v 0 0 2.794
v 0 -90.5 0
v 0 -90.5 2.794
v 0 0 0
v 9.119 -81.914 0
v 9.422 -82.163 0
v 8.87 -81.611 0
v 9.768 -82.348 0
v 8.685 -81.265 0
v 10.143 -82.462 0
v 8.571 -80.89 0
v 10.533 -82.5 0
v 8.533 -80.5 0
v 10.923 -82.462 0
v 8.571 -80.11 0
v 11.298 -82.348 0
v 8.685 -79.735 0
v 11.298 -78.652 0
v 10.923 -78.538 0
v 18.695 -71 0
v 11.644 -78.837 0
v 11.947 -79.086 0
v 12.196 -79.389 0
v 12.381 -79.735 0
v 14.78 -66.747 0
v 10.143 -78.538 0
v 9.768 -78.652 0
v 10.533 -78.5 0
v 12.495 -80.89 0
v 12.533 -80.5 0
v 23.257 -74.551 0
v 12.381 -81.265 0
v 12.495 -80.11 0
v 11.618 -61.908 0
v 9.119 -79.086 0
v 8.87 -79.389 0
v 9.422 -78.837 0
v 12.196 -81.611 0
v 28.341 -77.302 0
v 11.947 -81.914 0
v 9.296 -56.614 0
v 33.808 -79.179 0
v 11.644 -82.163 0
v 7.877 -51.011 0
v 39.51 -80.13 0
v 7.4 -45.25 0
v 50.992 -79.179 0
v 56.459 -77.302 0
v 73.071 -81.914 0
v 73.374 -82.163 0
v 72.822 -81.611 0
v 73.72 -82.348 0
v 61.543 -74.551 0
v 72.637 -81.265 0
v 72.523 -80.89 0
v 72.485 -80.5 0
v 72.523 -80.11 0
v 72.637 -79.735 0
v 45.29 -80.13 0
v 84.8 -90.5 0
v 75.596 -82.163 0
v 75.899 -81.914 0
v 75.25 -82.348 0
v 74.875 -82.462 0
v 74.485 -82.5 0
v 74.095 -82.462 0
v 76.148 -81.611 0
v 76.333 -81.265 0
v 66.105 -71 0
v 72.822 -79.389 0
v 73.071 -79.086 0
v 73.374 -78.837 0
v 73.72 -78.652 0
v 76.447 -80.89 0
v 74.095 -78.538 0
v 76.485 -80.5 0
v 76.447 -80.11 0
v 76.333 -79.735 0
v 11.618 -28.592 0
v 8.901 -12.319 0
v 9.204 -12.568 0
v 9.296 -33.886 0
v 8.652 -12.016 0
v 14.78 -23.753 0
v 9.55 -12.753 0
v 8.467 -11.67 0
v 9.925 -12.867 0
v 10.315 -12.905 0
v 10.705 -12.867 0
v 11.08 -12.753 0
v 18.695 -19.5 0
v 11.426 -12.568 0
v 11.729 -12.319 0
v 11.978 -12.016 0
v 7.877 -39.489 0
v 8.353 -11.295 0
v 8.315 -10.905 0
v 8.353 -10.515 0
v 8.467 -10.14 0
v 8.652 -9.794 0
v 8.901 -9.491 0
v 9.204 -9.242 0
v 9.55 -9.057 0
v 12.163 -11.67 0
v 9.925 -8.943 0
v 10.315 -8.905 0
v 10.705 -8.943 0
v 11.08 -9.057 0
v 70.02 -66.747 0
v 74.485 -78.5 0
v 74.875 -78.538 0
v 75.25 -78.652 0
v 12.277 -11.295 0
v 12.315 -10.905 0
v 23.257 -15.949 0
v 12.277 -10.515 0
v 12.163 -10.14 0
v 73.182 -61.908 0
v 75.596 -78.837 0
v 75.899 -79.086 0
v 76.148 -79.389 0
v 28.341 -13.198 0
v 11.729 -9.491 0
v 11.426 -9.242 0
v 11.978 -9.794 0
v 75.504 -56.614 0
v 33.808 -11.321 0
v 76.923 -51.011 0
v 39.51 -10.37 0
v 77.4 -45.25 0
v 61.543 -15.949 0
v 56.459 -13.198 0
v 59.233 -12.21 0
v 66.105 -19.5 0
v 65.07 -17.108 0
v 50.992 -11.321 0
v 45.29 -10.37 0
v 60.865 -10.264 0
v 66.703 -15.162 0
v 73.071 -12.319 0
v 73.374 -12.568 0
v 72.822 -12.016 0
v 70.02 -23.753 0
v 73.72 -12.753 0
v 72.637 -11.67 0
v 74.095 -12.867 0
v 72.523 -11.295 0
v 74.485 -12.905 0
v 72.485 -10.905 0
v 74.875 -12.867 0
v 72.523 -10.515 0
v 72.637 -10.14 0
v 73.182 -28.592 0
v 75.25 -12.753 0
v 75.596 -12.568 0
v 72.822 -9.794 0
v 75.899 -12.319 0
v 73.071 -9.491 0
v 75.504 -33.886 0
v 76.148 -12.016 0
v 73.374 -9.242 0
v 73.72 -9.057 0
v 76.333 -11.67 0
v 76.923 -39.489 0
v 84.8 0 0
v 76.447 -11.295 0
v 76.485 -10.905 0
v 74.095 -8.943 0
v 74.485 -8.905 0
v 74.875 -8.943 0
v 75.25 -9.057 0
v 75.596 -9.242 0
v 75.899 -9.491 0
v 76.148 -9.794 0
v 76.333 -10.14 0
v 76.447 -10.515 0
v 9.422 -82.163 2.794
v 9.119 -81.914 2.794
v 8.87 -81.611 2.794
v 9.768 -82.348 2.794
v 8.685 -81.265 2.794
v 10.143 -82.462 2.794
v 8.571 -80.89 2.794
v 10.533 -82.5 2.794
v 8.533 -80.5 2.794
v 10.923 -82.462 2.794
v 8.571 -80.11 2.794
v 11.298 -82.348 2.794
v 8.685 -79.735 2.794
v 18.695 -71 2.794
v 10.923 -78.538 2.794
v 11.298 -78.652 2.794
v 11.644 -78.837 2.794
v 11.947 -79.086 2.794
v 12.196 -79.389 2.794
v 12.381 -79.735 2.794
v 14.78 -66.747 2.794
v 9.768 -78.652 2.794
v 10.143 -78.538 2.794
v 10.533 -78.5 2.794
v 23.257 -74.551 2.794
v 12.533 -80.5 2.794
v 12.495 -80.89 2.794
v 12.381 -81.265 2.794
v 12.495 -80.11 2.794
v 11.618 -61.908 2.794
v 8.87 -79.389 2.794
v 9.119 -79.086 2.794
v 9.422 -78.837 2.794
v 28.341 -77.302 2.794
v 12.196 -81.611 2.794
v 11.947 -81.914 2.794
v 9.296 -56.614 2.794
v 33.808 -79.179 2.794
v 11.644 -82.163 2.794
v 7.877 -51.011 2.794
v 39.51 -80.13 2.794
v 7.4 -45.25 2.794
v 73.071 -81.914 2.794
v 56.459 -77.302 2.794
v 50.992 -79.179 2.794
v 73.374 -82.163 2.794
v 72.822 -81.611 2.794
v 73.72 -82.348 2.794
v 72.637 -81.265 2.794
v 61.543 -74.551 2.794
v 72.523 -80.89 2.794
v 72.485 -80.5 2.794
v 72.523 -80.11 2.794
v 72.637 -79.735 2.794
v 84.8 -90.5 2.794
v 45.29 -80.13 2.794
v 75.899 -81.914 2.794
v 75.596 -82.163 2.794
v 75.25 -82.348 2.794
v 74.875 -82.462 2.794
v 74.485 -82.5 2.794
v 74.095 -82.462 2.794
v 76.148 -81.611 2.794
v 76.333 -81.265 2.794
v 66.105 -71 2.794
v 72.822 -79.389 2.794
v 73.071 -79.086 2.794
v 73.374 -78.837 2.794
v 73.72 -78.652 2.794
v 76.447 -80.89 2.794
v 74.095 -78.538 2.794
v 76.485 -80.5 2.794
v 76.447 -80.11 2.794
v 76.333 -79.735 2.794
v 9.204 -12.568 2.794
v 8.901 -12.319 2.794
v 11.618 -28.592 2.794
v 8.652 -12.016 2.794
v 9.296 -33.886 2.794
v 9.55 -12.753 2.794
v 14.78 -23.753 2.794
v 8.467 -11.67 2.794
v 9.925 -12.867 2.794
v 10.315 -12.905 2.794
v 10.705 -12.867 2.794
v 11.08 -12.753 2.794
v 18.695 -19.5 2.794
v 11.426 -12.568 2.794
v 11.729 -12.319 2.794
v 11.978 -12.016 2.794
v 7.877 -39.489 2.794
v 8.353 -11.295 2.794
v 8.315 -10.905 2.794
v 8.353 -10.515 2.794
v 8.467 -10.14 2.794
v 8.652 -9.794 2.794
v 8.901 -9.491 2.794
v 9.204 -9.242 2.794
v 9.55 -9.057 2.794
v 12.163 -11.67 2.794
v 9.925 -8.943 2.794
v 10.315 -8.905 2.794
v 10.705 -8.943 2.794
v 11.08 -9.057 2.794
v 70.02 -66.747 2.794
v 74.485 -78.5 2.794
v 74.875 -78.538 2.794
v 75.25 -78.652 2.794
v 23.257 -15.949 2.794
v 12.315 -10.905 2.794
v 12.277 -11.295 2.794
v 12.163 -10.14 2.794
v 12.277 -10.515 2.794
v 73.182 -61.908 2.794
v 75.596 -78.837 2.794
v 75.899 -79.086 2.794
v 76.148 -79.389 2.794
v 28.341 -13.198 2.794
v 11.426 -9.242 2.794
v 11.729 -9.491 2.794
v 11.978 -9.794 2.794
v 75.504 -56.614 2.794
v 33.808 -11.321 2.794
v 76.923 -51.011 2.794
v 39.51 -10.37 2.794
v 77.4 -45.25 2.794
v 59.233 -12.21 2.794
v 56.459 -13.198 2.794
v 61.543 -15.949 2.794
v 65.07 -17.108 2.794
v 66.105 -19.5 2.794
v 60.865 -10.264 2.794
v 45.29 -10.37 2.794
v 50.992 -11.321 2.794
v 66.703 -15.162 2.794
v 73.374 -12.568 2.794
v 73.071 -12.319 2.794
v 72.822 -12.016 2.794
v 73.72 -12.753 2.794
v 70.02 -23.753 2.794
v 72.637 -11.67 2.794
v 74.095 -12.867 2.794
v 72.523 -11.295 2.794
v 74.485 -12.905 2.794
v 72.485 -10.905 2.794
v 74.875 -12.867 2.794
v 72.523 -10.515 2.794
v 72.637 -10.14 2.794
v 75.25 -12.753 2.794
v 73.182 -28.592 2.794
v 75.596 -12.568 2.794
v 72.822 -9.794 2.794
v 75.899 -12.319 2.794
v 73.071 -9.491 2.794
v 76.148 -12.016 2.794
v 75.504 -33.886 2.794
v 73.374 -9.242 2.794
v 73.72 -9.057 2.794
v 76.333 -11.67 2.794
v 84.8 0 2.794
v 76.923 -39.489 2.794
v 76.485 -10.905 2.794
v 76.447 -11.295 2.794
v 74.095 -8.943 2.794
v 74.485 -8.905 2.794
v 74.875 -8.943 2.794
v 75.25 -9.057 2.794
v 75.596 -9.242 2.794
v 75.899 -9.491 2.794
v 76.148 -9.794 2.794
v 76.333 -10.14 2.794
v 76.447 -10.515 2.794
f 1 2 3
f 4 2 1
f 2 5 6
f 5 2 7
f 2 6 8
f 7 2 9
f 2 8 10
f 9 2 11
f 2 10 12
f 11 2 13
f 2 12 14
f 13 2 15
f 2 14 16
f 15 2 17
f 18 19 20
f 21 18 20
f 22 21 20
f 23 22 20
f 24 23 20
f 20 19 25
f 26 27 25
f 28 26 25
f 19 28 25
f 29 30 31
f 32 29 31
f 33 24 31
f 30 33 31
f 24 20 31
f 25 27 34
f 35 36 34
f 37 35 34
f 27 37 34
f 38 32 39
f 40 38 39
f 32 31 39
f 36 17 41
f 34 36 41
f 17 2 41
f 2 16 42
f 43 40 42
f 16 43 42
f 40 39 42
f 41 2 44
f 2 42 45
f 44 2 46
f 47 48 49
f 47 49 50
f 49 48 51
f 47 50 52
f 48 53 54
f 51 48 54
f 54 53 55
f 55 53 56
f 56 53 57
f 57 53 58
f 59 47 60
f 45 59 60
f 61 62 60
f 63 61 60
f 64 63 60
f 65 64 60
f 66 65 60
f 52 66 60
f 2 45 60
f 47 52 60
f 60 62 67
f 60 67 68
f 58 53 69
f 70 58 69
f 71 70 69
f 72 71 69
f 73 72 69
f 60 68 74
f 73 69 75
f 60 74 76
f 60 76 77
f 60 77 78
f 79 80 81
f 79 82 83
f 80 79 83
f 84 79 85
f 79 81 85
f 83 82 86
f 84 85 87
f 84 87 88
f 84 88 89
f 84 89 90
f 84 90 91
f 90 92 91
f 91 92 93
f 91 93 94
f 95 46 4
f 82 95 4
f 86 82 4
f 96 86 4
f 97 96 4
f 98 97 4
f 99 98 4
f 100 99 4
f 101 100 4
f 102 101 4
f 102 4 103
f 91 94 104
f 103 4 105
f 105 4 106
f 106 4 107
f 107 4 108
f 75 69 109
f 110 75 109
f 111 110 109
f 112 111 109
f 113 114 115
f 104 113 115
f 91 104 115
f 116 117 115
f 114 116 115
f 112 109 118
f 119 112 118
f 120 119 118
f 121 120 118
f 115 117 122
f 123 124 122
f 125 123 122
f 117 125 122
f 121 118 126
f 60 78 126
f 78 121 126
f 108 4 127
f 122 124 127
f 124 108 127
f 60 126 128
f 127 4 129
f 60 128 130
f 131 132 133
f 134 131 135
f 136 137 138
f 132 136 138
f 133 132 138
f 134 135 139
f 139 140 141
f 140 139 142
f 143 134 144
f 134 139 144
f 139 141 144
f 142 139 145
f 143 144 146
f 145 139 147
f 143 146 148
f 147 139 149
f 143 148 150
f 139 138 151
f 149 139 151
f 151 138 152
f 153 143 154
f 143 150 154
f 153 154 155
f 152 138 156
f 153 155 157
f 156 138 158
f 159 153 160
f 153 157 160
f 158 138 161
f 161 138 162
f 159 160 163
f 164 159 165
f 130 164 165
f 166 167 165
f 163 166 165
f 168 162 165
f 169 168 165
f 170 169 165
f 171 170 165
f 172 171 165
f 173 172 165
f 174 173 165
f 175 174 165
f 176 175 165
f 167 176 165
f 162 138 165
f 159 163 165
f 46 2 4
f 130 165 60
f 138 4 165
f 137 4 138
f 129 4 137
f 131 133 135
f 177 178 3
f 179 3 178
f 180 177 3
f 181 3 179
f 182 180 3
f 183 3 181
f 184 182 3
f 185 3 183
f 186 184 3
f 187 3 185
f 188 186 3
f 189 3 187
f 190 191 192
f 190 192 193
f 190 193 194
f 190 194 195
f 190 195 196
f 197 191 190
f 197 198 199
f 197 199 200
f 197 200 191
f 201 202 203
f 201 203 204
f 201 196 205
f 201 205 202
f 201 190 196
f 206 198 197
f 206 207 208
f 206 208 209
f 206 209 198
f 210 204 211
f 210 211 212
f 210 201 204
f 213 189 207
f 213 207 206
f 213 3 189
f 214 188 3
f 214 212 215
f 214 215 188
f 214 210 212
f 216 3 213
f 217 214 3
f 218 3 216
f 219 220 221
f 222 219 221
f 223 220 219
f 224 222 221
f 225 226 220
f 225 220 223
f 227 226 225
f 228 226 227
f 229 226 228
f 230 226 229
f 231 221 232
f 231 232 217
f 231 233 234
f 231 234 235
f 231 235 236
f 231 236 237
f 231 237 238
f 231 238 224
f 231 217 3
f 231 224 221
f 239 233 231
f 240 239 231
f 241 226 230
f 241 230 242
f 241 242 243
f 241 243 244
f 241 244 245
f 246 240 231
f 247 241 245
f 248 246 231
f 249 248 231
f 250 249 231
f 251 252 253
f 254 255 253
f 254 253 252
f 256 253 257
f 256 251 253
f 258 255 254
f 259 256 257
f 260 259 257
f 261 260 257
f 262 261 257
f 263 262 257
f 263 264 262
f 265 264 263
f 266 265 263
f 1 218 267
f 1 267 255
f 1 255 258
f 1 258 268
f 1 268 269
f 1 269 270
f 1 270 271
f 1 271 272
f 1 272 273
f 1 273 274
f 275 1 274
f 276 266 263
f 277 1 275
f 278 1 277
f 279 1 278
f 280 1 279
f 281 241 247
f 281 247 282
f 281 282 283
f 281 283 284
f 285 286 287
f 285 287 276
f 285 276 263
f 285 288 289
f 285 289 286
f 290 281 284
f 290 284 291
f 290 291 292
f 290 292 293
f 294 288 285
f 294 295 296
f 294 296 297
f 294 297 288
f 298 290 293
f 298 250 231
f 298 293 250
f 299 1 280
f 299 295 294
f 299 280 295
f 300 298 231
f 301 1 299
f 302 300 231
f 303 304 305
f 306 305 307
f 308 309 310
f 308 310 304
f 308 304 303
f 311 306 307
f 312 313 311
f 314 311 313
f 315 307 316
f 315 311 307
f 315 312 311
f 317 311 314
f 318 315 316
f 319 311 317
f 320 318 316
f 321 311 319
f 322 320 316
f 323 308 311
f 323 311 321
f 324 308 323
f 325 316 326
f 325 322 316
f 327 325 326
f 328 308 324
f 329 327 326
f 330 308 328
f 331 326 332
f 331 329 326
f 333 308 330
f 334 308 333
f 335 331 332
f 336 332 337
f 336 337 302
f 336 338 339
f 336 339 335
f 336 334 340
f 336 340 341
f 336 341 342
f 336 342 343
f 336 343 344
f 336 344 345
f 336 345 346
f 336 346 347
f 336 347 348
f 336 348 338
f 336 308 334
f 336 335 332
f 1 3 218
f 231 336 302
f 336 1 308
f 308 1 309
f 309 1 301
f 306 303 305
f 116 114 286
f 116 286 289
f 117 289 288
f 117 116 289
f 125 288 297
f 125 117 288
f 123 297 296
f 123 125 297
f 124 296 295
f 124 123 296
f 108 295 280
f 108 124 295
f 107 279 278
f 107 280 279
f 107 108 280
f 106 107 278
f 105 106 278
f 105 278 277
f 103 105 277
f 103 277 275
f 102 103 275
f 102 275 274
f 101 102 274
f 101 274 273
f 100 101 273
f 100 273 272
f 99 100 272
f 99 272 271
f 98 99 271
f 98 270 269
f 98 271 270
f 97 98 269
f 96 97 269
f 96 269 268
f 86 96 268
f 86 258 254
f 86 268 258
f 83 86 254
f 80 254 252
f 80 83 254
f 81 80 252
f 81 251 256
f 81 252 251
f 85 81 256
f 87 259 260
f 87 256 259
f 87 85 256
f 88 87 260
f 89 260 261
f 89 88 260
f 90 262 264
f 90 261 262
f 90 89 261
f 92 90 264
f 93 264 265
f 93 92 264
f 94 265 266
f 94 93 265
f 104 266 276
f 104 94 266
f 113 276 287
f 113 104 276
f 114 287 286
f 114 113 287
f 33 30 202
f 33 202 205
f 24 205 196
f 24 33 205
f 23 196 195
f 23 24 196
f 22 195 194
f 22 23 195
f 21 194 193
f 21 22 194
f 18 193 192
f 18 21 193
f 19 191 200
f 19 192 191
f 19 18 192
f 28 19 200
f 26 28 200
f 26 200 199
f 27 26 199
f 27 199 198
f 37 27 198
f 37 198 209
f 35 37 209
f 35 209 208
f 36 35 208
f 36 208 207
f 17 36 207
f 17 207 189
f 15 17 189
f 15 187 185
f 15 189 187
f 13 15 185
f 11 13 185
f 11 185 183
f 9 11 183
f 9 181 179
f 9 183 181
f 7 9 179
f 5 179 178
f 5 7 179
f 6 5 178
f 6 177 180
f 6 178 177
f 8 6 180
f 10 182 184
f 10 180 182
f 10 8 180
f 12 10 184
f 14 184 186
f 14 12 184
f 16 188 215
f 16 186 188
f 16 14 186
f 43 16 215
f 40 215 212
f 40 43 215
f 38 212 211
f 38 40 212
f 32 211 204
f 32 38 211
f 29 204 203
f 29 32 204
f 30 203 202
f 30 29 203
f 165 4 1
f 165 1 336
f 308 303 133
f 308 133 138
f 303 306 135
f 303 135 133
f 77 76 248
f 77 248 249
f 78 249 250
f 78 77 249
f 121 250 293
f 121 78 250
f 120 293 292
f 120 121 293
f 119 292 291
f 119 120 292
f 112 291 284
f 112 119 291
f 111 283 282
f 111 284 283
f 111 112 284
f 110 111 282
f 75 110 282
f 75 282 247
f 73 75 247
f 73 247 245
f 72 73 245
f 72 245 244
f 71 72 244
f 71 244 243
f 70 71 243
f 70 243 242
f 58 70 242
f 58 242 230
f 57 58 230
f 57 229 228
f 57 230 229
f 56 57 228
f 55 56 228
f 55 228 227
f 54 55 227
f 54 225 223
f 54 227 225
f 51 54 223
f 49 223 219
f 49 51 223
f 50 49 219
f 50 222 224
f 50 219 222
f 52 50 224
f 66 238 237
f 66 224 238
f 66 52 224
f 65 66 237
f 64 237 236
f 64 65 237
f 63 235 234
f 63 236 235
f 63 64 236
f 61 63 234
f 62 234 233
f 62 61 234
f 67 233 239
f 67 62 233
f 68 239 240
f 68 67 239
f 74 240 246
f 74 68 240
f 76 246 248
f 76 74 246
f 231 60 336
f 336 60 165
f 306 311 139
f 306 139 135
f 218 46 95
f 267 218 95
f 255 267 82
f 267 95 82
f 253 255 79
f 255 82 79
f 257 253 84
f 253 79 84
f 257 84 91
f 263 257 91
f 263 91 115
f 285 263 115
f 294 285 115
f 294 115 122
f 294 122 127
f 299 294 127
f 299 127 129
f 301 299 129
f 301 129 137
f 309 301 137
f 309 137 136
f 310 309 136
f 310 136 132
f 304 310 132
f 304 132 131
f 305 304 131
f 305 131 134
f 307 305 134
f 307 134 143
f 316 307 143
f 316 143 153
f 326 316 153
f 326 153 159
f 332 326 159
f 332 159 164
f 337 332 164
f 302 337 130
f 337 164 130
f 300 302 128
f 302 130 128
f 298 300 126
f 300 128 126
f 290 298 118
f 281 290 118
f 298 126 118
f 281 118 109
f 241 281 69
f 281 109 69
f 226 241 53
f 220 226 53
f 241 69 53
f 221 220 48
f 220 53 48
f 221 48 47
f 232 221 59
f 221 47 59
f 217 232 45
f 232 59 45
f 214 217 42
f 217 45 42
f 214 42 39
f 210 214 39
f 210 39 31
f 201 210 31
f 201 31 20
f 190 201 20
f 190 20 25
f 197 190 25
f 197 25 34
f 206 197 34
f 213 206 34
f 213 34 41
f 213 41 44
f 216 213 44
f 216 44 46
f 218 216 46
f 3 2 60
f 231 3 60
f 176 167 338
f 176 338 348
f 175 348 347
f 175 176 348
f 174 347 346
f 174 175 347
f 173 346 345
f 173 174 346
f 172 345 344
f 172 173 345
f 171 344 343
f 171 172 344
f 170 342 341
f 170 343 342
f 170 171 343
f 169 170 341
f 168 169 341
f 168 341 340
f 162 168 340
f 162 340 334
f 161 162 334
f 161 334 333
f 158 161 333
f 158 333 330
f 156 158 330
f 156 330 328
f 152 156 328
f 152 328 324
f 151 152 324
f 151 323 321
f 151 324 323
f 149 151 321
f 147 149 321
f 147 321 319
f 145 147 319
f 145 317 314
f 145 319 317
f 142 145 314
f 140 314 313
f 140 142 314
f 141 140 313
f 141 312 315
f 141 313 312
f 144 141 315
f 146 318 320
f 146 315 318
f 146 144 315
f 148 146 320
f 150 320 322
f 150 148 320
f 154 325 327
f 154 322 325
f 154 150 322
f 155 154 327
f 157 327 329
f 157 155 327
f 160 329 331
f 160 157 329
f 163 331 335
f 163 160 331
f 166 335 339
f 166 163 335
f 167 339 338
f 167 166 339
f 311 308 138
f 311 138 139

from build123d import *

# Parameters (mm, degrees)
SKETCH1_W               = 84.8
SKETCH1_H               = 90.5
BOSS_EXTRUDE1_DEPTH     = 2.794
CUT_EXTRUDE1_DEPTH      = 125.05279697
CUT_EXTRUDE1_DEPTH_BACK = 125.05279697
SKETCH2_R               = 2
CUT_EXTRUDE2_DEPTH      = 125.05279697
CUT_EXTRUDE2_DEPTH_BACK = 125.05279697
SKETCH3_R               = 1.7145
SKETCH4_R               = 35
CUT_EXTRUDE3_DEPTH      = 10
CUT_EXTRUDE4_DEPTH      = 10


with BuildPart() as part:
    # Sketch1 → Boss-Extrude1 (new body)
    with BuildSketch(Plane.XY):
        with Locations((42.4, -45.25)):
            Rectangle(SKETCH1_W, SKETCH1_H)
    extrude(amount=BOSS_EXTRUDE1_DEPTH)

    # Sketch2 → Cut-Extrude1 (cut, two sides: drawn at the far end of the back side and taken through both)
    with BuildSketch(Plane.XY.offset(2.794).offset(-CUT_EXTRUDE1_DEPTH_BACK)):
        with Locations((10.31500695, -10.904966862)):
            Circle(SKETCH2_R)
        with Locations((74.48499305, -10.904966862)):
            Circle(SKETCH2_R)
        with Locations((74.48499305, -80.5)):
            Circle(SKETCH2_R)
        with Locations((10.53300695, -80.5)):
            Circle(SKETCH2_R)
    extrude(amount=CUT_EXTRUDE1_DEPTH + CUT_EXTRUDE1_DEPTH_BACK, mode=Mode.SUBTRACT)

    # Sketch3 → Cut-Extrude2 (cut, two sides: drawn at the far end of the back side and taken through both)
    with BuildSketch(Plane(origin=(0, 0, 0), x_dir=(-1, 0, 0), z_dir=(0, 0, -1)).offset(-CUT_EXTRUDE2_DEPTH_BACK)):
        with Locations((-42.4, -45.25)):
            Circle(SKETCH3_R)
    extrude(amount=CUT_EXTRUDE2_DEPTH + CUT_EXTRUDE2_DEPTH_BACK, mode=Mode.SUBTRACT)

    # Sketch4 → Cut-Extrude3 (cut)
    with BuildSketch(Plane(origin=(0, 0, 0), x_dir=(-1, 0, 0), z_dir=(0, 0, -1))):
        with Locations((-42.4, -45.25)):
            Circle(SKETCH4_R)
    extrude(amount=-CUT_EXTRUDE3_DEPTH, mode=Mode.SUBTRACT)

    # Sketch5 → Cut-Extrude4 (cut)
    with BuildSketch(Plane.XY.offset(2.794)):
        Polygon((60.865488083, -10.264365241), (66.70274674, -15.162406827), (65.070066211, -17.108159712), (59.232807555, -12.210118127), align=None)
    extrude(amount=-CUT_EXTRUDE4_DEPTH, mode=Mode.SUBTRACT)


solid = part.part
